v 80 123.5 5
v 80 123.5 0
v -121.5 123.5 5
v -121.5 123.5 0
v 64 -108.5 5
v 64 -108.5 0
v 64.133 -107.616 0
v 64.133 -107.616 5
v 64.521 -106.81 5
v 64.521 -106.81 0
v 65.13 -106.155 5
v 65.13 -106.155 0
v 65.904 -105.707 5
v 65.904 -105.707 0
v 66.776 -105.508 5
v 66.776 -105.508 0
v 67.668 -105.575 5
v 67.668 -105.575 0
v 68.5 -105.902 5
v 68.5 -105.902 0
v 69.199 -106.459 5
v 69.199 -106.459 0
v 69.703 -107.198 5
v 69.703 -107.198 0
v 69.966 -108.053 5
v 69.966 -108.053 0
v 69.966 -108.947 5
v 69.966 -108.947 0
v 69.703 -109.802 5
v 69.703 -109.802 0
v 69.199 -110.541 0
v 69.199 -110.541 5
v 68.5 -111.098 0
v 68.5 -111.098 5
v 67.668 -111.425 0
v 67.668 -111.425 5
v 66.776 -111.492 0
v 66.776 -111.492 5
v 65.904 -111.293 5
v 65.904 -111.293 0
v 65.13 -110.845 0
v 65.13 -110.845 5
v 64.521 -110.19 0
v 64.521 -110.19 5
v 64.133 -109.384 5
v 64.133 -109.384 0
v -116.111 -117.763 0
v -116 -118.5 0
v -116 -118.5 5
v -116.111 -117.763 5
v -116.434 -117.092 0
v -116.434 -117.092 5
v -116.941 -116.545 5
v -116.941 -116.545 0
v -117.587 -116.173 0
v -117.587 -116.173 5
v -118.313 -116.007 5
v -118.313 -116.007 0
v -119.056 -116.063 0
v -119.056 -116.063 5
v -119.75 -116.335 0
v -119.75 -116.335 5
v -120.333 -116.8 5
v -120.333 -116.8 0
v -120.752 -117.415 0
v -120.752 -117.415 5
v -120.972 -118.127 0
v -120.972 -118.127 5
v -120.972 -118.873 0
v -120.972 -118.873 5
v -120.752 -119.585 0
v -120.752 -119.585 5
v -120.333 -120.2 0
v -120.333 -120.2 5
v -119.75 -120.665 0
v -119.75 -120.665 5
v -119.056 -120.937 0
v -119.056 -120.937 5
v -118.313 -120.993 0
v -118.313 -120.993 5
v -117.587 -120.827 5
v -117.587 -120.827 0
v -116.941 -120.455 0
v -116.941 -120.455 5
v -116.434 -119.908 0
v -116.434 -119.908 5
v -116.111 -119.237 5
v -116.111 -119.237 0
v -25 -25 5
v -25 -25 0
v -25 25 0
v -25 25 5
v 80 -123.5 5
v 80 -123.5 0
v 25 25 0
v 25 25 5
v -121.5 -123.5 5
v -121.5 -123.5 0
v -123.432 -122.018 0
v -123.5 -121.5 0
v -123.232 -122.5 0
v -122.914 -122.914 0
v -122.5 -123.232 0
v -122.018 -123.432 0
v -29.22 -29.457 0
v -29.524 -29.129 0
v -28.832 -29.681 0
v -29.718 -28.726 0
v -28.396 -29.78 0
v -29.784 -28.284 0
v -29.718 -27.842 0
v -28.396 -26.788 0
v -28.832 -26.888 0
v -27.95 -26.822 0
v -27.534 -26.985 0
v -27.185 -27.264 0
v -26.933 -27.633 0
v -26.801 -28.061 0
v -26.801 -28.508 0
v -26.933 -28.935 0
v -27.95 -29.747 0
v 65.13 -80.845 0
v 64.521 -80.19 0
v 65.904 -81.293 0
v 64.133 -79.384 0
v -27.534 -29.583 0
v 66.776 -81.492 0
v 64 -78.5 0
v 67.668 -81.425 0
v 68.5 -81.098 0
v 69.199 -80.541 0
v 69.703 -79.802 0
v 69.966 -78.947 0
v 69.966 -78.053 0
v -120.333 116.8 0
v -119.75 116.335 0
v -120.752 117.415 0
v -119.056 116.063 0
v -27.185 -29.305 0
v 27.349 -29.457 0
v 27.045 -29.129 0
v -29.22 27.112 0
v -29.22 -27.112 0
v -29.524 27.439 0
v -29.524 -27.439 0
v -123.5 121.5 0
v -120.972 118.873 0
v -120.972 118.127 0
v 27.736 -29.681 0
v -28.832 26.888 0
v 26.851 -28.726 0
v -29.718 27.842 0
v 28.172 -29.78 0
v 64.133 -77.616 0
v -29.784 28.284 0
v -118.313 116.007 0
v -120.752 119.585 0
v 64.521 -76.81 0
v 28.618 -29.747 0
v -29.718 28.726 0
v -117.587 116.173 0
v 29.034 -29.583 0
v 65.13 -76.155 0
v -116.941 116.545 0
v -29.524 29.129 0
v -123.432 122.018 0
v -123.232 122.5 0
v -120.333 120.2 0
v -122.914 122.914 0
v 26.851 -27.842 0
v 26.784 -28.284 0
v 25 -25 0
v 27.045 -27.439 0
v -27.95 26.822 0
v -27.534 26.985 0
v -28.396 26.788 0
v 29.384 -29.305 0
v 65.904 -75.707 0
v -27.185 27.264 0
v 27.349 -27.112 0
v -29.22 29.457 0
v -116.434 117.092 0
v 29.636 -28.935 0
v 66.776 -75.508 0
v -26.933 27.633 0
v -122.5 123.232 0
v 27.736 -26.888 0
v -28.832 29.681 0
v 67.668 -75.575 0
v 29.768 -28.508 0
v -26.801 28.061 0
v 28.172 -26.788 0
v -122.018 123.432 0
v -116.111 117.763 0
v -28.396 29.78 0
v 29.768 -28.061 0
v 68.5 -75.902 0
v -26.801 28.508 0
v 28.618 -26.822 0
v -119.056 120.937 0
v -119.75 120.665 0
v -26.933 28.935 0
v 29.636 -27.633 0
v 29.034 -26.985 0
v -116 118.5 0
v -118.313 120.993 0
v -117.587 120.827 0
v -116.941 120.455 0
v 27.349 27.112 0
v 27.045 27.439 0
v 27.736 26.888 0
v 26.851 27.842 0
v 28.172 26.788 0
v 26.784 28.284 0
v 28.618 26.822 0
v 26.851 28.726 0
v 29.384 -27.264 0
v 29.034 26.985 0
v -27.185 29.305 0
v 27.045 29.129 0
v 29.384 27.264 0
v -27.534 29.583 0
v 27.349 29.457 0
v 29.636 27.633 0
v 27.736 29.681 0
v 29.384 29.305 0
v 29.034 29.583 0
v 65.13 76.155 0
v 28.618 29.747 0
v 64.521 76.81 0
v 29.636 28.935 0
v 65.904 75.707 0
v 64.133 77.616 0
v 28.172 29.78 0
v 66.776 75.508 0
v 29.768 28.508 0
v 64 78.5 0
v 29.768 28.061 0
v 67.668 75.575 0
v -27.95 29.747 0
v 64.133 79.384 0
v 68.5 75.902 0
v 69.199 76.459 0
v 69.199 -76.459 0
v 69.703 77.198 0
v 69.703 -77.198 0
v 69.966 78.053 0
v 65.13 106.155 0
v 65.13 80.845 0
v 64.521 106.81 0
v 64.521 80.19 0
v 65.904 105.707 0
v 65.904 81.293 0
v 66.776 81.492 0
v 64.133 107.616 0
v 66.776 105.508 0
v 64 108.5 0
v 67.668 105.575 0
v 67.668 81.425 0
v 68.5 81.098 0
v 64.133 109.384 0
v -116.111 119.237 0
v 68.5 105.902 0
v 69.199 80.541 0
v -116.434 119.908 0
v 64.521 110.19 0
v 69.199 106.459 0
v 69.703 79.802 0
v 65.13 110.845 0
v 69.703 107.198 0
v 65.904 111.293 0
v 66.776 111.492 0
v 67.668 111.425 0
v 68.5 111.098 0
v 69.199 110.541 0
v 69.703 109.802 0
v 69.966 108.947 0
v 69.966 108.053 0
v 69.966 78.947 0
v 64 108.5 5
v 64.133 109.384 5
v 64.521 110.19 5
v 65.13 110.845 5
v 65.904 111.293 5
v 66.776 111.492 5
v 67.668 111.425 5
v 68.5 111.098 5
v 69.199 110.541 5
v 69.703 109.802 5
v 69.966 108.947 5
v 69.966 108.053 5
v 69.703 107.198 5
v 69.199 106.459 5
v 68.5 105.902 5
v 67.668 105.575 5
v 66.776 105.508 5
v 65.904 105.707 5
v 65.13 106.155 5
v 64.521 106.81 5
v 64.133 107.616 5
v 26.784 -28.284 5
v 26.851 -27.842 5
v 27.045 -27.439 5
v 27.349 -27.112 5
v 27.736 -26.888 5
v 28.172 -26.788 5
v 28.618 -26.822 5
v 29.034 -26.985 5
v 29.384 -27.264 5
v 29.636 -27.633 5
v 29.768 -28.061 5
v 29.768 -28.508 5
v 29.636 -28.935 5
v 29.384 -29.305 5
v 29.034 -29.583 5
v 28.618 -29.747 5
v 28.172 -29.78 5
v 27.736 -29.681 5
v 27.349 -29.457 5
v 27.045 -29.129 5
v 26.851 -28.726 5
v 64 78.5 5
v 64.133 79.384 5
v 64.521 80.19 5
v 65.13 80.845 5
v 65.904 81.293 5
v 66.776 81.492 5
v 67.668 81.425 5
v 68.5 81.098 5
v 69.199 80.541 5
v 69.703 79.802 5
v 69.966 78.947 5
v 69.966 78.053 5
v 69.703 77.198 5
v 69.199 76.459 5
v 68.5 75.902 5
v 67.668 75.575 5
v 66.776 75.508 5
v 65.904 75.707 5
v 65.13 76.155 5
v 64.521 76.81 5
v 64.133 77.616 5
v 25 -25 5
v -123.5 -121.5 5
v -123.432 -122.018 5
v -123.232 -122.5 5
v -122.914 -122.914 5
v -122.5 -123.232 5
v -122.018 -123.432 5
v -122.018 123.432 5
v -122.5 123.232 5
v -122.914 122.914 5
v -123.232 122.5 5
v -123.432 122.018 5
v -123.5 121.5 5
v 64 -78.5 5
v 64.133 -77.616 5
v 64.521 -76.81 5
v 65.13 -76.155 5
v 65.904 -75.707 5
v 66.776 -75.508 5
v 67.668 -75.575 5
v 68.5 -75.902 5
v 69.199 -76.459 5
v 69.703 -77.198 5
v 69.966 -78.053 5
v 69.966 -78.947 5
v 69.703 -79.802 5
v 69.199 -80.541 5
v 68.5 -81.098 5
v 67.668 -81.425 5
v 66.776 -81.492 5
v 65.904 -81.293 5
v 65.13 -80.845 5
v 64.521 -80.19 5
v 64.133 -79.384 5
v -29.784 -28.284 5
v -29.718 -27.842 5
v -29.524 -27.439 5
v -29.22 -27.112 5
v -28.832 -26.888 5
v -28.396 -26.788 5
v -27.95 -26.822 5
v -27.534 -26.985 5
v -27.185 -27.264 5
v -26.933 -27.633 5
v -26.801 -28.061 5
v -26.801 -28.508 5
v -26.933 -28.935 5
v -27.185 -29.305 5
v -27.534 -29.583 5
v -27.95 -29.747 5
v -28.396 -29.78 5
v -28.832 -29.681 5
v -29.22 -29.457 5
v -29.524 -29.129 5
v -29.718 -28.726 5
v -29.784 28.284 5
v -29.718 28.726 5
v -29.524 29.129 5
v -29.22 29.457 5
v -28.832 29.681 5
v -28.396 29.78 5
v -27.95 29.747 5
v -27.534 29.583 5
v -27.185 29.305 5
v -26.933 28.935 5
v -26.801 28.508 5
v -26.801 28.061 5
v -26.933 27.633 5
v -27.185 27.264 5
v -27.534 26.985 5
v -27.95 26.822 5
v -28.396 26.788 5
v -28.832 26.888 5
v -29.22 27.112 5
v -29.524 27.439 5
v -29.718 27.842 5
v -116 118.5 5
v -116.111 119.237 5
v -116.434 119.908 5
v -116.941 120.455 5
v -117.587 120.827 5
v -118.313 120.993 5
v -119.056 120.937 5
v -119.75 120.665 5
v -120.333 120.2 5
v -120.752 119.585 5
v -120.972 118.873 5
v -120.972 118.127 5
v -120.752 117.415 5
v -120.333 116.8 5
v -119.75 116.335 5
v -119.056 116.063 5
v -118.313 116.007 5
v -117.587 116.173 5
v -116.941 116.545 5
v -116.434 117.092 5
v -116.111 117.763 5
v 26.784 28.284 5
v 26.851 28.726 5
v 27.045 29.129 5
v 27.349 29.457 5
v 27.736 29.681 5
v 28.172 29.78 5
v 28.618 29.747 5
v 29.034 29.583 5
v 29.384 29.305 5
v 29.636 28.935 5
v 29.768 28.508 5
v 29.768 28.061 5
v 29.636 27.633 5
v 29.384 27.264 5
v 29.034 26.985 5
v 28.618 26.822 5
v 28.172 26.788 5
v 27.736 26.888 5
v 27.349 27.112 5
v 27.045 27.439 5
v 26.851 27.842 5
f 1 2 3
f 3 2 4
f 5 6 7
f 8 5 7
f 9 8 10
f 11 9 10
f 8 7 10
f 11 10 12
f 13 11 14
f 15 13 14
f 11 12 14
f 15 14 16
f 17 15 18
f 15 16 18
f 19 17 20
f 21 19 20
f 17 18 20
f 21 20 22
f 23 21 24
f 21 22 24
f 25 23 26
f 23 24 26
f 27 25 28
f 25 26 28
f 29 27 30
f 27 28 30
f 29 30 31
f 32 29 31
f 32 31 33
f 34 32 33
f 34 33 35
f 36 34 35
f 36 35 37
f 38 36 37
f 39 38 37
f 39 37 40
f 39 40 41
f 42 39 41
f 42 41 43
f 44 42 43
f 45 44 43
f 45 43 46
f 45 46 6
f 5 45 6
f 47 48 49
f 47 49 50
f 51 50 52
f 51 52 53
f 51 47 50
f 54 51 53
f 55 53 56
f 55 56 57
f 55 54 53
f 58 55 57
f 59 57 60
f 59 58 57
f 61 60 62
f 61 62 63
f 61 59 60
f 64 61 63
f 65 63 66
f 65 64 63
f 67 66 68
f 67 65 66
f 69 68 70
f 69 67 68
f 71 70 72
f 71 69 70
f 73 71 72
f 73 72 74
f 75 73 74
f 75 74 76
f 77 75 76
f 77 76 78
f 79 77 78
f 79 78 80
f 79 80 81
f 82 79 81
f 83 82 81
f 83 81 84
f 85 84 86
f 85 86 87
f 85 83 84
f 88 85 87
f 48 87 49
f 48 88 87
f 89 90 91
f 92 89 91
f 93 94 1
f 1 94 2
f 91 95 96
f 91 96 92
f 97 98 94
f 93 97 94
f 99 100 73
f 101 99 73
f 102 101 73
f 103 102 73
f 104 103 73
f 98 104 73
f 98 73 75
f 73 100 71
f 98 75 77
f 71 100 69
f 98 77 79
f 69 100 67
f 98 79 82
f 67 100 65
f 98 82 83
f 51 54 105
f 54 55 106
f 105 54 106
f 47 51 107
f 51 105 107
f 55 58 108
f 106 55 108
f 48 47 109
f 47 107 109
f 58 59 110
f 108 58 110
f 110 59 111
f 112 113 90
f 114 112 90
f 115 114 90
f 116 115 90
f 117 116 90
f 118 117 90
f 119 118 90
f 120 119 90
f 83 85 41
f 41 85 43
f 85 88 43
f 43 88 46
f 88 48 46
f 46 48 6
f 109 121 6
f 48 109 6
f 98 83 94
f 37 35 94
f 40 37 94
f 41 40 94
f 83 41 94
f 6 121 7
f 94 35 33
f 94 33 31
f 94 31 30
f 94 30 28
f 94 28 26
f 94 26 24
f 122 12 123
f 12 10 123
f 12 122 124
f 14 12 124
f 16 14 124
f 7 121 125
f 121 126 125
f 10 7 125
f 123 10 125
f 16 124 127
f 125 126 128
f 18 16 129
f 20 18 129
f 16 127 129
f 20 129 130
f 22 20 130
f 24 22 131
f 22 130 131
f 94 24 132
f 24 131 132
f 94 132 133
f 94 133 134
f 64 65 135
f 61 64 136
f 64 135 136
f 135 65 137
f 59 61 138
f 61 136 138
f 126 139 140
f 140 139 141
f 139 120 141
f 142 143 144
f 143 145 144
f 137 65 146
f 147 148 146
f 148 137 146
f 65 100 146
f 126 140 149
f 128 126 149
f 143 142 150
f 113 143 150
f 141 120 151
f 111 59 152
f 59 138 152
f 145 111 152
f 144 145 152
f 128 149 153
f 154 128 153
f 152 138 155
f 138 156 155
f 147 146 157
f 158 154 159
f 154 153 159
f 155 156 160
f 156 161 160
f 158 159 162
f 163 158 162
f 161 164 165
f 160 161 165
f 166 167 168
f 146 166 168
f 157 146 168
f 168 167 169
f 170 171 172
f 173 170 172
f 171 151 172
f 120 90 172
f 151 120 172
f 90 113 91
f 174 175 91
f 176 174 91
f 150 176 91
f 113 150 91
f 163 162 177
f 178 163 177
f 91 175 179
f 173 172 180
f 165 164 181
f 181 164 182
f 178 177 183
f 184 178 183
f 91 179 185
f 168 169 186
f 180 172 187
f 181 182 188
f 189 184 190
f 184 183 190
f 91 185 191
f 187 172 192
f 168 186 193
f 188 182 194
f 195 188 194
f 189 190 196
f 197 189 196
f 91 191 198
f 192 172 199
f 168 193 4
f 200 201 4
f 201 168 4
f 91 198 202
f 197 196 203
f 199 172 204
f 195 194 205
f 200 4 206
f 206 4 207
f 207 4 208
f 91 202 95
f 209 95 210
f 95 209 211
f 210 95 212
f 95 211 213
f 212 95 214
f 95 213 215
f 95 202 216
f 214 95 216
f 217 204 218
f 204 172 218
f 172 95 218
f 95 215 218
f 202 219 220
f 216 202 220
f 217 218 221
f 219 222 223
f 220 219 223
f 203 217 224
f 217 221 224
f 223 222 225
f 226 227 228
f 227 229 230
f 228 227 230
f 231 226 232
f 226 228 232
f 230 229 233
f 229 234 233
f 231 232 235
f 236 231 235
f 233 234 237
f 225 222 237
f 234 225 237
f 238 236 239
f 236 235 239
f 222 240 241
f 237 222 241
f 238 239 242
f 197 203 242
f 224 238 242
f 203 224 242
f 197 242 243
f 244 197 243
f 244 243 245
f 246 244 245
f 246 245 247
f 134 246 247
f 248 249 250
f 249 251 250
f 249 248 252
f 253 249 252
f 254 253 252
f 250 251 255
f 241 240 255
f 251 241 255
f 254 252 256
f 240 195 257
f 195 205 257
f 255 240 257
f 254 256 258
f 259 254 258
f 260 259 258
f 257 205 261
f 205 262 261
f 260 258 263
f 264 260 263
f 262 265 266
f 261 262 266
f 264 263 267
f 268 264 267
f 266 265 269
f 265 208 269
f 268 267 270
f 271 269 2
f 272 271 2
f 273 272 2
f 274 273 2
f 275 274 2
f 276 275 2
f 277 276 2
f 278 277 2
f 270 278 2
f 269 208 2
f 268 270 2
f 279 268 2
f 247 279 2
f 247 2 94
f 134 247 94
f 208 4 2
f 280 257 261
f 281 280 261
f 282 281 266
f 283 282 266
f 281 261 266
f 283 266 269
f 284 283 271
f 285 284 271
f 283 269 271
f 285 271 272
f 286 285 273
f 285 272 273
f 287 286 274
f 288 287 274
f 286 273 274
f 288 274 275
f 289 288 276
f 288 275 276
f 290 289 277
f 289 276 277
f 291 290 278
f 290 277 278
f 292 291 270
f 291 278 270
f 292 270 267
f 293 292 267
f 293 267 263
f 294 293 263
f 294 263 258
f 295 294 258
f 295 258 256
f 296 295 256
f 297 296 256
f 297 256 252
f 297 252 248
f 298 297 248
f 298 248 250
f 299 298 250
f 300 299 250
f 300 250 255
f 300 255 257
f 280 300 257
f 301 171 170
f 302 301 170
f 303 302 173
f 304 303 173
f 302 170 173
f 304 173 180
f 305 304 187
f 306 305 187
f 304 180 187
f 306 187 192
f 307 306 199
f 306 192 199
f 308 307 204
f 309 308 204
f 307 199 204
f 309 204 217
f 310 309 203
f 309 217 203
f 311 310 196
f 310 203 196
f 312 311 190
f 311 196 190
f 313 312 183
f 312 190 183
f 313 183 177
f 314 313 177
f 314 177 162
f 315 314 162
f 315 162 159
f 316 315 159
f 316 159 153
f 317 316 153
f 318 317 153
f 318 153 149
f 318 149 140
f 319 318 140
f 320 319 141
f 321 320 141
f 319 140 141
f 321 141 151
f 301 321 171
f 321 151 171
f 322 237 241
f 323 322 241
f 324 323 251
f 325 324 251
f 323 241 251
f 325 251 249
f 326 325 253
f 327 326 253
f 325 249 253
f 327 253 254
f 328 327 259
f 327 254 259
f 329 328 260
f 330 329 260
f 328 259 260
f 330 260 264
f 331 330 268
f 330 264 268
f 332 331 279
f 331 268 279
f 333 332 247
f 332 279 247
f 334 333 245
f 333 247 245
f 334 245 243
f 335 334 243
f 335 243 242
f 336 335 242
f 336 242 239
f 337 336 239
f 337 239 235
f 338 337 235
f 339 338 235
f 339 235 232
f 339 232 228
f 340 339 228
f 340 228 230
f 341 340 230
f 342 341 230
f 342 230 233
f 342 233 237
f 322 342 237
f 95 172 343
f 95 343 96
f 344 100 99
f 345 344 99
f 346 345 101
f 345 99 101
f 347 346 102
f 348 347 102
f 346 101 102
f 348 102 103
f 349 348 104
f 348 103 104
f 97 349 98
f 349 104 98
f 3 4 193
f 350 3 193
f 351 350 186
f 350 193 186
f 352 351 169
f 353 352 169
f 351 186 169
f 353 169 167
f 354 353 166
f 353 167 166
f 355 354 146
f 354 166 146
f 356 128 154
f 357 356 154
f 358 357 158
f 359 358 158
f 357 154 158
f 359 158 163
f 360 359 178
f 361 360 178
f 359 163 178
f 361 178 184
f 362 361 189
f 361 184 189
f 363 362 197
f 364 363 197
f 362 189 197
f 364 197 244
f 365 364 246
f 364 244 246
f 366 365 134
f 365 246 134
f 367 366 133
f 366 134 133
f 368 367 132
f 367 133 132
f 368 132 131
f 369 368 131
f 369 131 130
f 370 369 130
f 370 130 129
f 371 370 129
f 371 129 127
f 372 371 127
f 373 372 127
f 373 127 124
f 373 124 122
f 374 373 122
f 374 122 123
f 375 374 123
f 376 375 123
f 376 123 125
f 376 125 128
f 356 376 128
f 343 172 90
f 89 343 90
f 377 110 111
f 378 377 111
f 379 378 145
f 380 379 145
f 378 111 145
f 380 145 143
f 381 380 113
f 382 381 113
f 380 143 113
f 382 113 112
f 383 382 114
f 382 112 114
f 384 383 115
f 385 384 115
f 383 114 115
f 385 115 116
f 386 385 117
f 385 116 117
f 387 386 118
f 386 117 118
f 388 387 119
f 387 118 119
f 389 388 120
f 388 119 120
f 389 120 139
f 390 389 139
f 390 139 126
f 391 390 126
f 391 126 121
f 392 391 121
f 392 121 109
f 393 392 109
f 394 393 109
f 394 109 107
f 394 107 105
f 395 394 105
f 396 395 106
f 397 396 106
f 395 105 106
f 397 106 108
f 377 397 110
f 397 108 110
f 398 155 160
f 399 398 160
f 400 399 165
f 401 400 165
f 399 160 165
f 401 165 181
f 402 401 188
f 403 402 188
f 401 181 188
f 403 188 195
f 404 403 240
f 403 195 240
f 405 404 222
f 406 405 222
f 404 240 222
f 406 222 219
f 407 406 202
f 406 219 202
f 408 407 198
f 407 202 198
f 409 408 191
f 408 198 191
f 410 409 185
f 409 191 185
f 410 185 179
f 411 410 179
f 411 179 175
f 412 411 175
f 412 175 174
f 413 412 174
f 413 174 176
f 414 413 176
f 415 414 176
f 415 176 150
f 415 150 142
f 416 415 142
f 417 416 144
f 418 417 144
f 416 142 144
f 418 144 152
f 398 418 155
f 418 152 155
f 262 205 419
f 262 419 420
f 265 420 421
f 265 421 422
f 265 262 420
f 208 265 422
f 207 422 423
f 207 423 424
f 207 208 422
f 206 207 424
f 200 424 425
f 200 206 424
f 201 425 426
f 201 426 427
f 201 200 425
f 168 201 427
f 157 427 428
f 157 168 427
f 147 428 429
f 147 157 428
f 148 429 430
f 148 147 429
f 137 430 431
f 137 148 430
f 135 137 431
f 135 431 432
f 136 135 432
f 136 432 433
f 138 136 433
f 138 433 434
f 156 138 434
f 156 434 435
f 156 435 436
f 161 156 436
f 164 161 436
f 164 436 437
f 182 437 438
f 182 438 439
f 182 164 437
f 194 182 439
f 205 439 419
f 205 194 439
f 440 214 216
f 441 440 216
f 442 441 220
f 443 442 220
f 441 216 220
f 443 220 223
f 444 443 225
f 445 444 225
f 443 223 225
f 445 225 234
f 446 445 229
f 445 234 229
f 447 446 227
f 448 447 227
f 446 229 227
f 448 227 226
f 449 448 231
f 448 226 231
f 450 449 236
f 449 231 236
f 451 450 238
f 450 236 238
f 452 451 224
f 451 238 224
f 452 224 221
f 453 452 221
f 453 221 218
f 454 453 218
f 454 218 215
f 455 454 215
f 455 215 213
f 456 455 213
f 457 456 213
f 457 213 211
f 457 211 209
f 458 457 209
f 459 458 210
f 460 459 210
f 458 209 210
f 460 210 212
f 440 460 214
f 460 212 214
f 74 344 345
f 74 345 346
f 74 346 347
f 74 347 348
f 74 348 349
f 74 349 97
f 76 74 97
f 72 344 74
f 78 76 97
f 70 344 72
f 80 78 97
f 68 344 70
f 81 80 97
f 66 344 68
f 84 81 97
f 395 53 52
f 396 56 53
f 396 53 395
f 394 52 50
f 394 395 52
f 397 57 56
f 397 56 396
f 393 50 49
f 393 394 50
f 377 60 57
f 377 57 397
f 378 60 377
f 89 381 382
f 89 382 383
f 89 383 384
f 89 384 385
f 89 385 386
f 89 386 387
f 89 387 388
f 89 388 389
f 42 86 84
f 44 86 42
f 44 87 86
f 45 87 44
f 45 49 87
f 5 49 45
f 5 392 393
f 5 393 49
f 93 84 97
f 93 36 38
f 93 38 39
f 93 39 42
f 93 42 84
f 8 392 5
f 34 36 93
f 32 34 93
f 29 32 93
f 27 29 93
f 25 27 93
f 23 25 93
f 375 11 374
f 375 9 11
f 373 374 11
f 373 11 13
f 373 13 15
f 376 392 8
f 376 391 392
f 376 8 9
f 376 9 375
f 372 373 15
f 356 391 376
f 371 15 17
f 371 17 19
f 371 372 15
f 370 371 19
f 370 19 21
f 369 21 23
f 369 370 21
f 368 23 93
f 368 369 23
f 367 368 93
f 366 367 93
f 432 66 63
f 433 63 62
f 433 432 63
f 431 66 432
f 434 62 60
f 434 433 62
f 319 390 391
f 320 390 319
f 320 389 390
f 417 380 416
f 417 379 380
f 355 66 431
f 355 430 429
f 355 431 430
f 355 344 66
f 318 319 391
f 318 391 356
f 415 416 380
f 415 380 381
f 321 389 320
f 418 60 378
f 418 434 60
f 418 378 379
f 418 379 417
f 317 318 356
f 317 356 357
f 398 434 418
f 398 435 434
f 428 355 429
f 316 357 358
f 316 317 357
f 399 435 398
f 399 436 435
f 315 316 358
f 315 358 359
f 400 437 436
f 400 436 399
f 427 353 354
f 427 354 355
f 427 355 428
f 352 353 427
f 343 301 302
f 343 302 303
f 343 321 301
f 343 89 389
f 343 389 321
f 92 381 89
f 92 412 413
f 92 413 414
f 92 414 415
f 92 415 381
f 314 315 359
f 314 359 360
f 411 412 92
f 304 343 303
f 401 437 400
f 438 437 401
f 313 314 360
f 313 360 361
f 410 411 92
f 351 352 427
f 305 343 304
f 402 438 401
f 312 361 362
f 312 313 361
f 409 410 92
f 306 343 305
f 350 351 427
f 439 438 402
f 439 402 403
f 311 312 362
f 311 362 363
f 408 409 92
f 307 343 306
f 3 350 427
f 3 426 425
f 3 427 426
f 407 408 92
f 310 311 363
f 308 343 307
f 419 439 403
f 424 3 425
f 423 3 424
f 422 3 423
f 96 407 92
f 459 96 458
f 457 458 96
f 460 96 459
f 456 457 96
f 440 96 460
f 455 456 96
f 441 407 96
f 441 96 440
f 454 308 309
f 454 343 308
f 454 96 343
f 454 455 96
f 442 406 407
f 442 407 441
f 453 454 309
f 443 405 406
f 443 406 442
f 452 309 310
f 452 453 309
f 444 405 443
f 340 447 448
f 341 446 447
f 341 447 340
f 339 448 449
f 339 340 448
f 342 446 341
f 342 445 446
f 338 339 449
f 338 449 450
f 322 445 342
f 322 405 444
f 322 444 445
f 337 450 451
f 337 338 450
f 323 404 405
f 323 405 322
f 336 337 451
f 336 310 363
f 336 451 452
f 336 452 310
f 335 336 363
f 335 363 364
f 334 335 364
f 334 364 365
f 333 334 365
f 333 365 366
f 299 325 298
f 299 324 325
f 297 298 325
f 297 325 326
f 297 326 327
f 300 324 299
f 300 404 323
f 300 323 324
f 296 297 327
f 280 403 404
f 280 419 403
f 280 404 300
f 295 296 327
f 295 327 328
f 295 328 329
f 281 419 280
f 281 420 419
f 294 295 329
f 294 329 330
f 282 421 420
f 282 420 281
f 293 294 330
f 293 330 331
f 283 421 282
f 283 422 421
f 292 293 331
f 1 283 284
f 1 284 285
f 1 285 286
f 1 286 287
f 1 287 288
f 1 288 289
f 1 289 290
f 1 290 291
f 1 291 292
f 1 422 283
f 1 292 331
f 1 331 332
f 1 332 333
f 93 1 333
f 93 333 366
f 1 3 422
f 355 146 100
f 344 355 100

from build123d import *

# Parameters (mm, degrees)
SKETCH1_R           = 2.5
BOSS_EXTRUDE1_DEPTH = 5
SKETCH2_R           = 1.5
SKETCH2_W           = 50
SKETCH2_H           = 50
CUT_EXTRUDE1_DEPTH  = 5
SKETCH3_W           = 80
SKETCH3_H           = 300
CUT_EXTRUDE2_DEPTH  = 10
SKETCH5_R           = 3
CUT_EXTRUDE4_DEPTH  = 10
SKETCH4_R           = 3
CUT_EXTRUDE3_DEPTH  = 10


with BuildPart() as part:
    # Sketch1 → Boss-Extrude1 (new body)
    with BuildSketch(Plane.XY):
        with BuildLine():
            Line((-123.5, 121.5), (-123.5, -121.5))
            ThreePointArc((-123.5, -121.5), (-122.914213562, -122.914213562), (-121.5, -123.5))
            Line((-121.5, -123.5), (121.5, -123.5))
            ThreePointArc((121.5, -123.5), (122.914213562, -122.914213562), (123.5, -121.5))
            Line((123.5, -121.5), (123.5, 121.5))
            ThreePointArc((123.5, 121.5), (122.914213562, 122.914213562), (121.5, 123.5))
            Line((121.5, 123.5), (-121.5, 123.5))
            ThreePointArc((-121.5, 123.5), (-122.914213562, 122.914213562), (-123.5, 121.5))
        make_face()
        with Locations((-118.5, 118.5)):
            Circle(SKETCH1_R, mode=Mode.SUBTRACT)
        with Locations((118.5, 118.5)):
            Circle(SKETCH1_R, mode=Mode.SUBTRACT)
        with Locations((118.5, -118.5)):
            Circle(SKETCH1_R, mode=Mode.SUBTRACT)
        with Locations((-118.5, -118.5)):
            Circle(SKETCH1_R, mode=Mode.SUBTRACT)
    extrude(amount=BOSS_EXTRUDE1_DEPTH)

    # Sketch2 → Cut-Extrude1 (cut)
    with BuildSketch(Plane(origin=(0, 0, 0), x_dir=(-1, 0, 0), z_dir=(0, 0, -1))):
        with Locations((28.284271247, 28.284271247)):
            Circle(SKETCH2_R)
        with Locations((28.284271247, -28.284271247)):
            Circle(SKETCH2_R)
        with Locations((-28.284271247, -28.284271247)):
            Circle(SKETCH2_R)
        with Locations((-28.284271247, 28.284271247)):
            Circle(SKETCH2_R)
        Rectangle(SKETCH2_W, SKETCH2_H)
    extrude(amount=-CUT_EXTRUDE1_DEPTH, mode=Mode.SUBTRACT)

    # Sketch3 → Cut-Extrude2 (cut)
    with BuildSketch(Plane(origin=(0, 0, 0), x_dir=(-1, 0, 0), z_dir=(0, 0, -1))):
        with Locations((-120, 0)):
            Rectangle(SKETCH3_W, SKETCH3_H)
    extrude(amount=-CUT_EXTRUDE2_DEPTH, mode=Mode.SUBTRACT)

    # Sketch5 → Cut-Extrude4 (cut)
    with BuildSketch(Plane(origin=(0, 0, 0), x_dir=(-1, 0, 0), z_dir=(0, 0, -1))):
        with Locations((-67, 108.5)):
            Circle(SKETCH5_R)
        with Locations((-67, 78.5)):
            Circle(SKETCH5_R)
        with Locations((-67, -108.5)):
            Circle(SKETCH5_R)
        with Locations((-67, -78.5)):
            Circle(SKETCH5_R)
    extrude(amount=-CUT_EXTRUDE4_DEPTH, mode=Mode.SUBTRACT)

    # Sketch4 → Cut-Extrude3 (cut)
    with BuildSketch(Plane(origin=(0, 0, 0), x_dir=(-1, 0, 0), z_dir=(0, 0, -1))):
        with Locations((-93, 78.5)):
            Circle(SKETCH4_R)
        with Locations((-93, 108.5)):
            Circle(SKETCH4_R)
        with Locations((-93, -78.5)):
            Circle(SKETCH4_R)
        with Locations((-93, -108.5)):
            Circle(SKETCH4_R)
    extrude(amount=-CUT_EXTRUDE3_DEPTH, mode=Mode.SUBTRACT)


solid = part.part
